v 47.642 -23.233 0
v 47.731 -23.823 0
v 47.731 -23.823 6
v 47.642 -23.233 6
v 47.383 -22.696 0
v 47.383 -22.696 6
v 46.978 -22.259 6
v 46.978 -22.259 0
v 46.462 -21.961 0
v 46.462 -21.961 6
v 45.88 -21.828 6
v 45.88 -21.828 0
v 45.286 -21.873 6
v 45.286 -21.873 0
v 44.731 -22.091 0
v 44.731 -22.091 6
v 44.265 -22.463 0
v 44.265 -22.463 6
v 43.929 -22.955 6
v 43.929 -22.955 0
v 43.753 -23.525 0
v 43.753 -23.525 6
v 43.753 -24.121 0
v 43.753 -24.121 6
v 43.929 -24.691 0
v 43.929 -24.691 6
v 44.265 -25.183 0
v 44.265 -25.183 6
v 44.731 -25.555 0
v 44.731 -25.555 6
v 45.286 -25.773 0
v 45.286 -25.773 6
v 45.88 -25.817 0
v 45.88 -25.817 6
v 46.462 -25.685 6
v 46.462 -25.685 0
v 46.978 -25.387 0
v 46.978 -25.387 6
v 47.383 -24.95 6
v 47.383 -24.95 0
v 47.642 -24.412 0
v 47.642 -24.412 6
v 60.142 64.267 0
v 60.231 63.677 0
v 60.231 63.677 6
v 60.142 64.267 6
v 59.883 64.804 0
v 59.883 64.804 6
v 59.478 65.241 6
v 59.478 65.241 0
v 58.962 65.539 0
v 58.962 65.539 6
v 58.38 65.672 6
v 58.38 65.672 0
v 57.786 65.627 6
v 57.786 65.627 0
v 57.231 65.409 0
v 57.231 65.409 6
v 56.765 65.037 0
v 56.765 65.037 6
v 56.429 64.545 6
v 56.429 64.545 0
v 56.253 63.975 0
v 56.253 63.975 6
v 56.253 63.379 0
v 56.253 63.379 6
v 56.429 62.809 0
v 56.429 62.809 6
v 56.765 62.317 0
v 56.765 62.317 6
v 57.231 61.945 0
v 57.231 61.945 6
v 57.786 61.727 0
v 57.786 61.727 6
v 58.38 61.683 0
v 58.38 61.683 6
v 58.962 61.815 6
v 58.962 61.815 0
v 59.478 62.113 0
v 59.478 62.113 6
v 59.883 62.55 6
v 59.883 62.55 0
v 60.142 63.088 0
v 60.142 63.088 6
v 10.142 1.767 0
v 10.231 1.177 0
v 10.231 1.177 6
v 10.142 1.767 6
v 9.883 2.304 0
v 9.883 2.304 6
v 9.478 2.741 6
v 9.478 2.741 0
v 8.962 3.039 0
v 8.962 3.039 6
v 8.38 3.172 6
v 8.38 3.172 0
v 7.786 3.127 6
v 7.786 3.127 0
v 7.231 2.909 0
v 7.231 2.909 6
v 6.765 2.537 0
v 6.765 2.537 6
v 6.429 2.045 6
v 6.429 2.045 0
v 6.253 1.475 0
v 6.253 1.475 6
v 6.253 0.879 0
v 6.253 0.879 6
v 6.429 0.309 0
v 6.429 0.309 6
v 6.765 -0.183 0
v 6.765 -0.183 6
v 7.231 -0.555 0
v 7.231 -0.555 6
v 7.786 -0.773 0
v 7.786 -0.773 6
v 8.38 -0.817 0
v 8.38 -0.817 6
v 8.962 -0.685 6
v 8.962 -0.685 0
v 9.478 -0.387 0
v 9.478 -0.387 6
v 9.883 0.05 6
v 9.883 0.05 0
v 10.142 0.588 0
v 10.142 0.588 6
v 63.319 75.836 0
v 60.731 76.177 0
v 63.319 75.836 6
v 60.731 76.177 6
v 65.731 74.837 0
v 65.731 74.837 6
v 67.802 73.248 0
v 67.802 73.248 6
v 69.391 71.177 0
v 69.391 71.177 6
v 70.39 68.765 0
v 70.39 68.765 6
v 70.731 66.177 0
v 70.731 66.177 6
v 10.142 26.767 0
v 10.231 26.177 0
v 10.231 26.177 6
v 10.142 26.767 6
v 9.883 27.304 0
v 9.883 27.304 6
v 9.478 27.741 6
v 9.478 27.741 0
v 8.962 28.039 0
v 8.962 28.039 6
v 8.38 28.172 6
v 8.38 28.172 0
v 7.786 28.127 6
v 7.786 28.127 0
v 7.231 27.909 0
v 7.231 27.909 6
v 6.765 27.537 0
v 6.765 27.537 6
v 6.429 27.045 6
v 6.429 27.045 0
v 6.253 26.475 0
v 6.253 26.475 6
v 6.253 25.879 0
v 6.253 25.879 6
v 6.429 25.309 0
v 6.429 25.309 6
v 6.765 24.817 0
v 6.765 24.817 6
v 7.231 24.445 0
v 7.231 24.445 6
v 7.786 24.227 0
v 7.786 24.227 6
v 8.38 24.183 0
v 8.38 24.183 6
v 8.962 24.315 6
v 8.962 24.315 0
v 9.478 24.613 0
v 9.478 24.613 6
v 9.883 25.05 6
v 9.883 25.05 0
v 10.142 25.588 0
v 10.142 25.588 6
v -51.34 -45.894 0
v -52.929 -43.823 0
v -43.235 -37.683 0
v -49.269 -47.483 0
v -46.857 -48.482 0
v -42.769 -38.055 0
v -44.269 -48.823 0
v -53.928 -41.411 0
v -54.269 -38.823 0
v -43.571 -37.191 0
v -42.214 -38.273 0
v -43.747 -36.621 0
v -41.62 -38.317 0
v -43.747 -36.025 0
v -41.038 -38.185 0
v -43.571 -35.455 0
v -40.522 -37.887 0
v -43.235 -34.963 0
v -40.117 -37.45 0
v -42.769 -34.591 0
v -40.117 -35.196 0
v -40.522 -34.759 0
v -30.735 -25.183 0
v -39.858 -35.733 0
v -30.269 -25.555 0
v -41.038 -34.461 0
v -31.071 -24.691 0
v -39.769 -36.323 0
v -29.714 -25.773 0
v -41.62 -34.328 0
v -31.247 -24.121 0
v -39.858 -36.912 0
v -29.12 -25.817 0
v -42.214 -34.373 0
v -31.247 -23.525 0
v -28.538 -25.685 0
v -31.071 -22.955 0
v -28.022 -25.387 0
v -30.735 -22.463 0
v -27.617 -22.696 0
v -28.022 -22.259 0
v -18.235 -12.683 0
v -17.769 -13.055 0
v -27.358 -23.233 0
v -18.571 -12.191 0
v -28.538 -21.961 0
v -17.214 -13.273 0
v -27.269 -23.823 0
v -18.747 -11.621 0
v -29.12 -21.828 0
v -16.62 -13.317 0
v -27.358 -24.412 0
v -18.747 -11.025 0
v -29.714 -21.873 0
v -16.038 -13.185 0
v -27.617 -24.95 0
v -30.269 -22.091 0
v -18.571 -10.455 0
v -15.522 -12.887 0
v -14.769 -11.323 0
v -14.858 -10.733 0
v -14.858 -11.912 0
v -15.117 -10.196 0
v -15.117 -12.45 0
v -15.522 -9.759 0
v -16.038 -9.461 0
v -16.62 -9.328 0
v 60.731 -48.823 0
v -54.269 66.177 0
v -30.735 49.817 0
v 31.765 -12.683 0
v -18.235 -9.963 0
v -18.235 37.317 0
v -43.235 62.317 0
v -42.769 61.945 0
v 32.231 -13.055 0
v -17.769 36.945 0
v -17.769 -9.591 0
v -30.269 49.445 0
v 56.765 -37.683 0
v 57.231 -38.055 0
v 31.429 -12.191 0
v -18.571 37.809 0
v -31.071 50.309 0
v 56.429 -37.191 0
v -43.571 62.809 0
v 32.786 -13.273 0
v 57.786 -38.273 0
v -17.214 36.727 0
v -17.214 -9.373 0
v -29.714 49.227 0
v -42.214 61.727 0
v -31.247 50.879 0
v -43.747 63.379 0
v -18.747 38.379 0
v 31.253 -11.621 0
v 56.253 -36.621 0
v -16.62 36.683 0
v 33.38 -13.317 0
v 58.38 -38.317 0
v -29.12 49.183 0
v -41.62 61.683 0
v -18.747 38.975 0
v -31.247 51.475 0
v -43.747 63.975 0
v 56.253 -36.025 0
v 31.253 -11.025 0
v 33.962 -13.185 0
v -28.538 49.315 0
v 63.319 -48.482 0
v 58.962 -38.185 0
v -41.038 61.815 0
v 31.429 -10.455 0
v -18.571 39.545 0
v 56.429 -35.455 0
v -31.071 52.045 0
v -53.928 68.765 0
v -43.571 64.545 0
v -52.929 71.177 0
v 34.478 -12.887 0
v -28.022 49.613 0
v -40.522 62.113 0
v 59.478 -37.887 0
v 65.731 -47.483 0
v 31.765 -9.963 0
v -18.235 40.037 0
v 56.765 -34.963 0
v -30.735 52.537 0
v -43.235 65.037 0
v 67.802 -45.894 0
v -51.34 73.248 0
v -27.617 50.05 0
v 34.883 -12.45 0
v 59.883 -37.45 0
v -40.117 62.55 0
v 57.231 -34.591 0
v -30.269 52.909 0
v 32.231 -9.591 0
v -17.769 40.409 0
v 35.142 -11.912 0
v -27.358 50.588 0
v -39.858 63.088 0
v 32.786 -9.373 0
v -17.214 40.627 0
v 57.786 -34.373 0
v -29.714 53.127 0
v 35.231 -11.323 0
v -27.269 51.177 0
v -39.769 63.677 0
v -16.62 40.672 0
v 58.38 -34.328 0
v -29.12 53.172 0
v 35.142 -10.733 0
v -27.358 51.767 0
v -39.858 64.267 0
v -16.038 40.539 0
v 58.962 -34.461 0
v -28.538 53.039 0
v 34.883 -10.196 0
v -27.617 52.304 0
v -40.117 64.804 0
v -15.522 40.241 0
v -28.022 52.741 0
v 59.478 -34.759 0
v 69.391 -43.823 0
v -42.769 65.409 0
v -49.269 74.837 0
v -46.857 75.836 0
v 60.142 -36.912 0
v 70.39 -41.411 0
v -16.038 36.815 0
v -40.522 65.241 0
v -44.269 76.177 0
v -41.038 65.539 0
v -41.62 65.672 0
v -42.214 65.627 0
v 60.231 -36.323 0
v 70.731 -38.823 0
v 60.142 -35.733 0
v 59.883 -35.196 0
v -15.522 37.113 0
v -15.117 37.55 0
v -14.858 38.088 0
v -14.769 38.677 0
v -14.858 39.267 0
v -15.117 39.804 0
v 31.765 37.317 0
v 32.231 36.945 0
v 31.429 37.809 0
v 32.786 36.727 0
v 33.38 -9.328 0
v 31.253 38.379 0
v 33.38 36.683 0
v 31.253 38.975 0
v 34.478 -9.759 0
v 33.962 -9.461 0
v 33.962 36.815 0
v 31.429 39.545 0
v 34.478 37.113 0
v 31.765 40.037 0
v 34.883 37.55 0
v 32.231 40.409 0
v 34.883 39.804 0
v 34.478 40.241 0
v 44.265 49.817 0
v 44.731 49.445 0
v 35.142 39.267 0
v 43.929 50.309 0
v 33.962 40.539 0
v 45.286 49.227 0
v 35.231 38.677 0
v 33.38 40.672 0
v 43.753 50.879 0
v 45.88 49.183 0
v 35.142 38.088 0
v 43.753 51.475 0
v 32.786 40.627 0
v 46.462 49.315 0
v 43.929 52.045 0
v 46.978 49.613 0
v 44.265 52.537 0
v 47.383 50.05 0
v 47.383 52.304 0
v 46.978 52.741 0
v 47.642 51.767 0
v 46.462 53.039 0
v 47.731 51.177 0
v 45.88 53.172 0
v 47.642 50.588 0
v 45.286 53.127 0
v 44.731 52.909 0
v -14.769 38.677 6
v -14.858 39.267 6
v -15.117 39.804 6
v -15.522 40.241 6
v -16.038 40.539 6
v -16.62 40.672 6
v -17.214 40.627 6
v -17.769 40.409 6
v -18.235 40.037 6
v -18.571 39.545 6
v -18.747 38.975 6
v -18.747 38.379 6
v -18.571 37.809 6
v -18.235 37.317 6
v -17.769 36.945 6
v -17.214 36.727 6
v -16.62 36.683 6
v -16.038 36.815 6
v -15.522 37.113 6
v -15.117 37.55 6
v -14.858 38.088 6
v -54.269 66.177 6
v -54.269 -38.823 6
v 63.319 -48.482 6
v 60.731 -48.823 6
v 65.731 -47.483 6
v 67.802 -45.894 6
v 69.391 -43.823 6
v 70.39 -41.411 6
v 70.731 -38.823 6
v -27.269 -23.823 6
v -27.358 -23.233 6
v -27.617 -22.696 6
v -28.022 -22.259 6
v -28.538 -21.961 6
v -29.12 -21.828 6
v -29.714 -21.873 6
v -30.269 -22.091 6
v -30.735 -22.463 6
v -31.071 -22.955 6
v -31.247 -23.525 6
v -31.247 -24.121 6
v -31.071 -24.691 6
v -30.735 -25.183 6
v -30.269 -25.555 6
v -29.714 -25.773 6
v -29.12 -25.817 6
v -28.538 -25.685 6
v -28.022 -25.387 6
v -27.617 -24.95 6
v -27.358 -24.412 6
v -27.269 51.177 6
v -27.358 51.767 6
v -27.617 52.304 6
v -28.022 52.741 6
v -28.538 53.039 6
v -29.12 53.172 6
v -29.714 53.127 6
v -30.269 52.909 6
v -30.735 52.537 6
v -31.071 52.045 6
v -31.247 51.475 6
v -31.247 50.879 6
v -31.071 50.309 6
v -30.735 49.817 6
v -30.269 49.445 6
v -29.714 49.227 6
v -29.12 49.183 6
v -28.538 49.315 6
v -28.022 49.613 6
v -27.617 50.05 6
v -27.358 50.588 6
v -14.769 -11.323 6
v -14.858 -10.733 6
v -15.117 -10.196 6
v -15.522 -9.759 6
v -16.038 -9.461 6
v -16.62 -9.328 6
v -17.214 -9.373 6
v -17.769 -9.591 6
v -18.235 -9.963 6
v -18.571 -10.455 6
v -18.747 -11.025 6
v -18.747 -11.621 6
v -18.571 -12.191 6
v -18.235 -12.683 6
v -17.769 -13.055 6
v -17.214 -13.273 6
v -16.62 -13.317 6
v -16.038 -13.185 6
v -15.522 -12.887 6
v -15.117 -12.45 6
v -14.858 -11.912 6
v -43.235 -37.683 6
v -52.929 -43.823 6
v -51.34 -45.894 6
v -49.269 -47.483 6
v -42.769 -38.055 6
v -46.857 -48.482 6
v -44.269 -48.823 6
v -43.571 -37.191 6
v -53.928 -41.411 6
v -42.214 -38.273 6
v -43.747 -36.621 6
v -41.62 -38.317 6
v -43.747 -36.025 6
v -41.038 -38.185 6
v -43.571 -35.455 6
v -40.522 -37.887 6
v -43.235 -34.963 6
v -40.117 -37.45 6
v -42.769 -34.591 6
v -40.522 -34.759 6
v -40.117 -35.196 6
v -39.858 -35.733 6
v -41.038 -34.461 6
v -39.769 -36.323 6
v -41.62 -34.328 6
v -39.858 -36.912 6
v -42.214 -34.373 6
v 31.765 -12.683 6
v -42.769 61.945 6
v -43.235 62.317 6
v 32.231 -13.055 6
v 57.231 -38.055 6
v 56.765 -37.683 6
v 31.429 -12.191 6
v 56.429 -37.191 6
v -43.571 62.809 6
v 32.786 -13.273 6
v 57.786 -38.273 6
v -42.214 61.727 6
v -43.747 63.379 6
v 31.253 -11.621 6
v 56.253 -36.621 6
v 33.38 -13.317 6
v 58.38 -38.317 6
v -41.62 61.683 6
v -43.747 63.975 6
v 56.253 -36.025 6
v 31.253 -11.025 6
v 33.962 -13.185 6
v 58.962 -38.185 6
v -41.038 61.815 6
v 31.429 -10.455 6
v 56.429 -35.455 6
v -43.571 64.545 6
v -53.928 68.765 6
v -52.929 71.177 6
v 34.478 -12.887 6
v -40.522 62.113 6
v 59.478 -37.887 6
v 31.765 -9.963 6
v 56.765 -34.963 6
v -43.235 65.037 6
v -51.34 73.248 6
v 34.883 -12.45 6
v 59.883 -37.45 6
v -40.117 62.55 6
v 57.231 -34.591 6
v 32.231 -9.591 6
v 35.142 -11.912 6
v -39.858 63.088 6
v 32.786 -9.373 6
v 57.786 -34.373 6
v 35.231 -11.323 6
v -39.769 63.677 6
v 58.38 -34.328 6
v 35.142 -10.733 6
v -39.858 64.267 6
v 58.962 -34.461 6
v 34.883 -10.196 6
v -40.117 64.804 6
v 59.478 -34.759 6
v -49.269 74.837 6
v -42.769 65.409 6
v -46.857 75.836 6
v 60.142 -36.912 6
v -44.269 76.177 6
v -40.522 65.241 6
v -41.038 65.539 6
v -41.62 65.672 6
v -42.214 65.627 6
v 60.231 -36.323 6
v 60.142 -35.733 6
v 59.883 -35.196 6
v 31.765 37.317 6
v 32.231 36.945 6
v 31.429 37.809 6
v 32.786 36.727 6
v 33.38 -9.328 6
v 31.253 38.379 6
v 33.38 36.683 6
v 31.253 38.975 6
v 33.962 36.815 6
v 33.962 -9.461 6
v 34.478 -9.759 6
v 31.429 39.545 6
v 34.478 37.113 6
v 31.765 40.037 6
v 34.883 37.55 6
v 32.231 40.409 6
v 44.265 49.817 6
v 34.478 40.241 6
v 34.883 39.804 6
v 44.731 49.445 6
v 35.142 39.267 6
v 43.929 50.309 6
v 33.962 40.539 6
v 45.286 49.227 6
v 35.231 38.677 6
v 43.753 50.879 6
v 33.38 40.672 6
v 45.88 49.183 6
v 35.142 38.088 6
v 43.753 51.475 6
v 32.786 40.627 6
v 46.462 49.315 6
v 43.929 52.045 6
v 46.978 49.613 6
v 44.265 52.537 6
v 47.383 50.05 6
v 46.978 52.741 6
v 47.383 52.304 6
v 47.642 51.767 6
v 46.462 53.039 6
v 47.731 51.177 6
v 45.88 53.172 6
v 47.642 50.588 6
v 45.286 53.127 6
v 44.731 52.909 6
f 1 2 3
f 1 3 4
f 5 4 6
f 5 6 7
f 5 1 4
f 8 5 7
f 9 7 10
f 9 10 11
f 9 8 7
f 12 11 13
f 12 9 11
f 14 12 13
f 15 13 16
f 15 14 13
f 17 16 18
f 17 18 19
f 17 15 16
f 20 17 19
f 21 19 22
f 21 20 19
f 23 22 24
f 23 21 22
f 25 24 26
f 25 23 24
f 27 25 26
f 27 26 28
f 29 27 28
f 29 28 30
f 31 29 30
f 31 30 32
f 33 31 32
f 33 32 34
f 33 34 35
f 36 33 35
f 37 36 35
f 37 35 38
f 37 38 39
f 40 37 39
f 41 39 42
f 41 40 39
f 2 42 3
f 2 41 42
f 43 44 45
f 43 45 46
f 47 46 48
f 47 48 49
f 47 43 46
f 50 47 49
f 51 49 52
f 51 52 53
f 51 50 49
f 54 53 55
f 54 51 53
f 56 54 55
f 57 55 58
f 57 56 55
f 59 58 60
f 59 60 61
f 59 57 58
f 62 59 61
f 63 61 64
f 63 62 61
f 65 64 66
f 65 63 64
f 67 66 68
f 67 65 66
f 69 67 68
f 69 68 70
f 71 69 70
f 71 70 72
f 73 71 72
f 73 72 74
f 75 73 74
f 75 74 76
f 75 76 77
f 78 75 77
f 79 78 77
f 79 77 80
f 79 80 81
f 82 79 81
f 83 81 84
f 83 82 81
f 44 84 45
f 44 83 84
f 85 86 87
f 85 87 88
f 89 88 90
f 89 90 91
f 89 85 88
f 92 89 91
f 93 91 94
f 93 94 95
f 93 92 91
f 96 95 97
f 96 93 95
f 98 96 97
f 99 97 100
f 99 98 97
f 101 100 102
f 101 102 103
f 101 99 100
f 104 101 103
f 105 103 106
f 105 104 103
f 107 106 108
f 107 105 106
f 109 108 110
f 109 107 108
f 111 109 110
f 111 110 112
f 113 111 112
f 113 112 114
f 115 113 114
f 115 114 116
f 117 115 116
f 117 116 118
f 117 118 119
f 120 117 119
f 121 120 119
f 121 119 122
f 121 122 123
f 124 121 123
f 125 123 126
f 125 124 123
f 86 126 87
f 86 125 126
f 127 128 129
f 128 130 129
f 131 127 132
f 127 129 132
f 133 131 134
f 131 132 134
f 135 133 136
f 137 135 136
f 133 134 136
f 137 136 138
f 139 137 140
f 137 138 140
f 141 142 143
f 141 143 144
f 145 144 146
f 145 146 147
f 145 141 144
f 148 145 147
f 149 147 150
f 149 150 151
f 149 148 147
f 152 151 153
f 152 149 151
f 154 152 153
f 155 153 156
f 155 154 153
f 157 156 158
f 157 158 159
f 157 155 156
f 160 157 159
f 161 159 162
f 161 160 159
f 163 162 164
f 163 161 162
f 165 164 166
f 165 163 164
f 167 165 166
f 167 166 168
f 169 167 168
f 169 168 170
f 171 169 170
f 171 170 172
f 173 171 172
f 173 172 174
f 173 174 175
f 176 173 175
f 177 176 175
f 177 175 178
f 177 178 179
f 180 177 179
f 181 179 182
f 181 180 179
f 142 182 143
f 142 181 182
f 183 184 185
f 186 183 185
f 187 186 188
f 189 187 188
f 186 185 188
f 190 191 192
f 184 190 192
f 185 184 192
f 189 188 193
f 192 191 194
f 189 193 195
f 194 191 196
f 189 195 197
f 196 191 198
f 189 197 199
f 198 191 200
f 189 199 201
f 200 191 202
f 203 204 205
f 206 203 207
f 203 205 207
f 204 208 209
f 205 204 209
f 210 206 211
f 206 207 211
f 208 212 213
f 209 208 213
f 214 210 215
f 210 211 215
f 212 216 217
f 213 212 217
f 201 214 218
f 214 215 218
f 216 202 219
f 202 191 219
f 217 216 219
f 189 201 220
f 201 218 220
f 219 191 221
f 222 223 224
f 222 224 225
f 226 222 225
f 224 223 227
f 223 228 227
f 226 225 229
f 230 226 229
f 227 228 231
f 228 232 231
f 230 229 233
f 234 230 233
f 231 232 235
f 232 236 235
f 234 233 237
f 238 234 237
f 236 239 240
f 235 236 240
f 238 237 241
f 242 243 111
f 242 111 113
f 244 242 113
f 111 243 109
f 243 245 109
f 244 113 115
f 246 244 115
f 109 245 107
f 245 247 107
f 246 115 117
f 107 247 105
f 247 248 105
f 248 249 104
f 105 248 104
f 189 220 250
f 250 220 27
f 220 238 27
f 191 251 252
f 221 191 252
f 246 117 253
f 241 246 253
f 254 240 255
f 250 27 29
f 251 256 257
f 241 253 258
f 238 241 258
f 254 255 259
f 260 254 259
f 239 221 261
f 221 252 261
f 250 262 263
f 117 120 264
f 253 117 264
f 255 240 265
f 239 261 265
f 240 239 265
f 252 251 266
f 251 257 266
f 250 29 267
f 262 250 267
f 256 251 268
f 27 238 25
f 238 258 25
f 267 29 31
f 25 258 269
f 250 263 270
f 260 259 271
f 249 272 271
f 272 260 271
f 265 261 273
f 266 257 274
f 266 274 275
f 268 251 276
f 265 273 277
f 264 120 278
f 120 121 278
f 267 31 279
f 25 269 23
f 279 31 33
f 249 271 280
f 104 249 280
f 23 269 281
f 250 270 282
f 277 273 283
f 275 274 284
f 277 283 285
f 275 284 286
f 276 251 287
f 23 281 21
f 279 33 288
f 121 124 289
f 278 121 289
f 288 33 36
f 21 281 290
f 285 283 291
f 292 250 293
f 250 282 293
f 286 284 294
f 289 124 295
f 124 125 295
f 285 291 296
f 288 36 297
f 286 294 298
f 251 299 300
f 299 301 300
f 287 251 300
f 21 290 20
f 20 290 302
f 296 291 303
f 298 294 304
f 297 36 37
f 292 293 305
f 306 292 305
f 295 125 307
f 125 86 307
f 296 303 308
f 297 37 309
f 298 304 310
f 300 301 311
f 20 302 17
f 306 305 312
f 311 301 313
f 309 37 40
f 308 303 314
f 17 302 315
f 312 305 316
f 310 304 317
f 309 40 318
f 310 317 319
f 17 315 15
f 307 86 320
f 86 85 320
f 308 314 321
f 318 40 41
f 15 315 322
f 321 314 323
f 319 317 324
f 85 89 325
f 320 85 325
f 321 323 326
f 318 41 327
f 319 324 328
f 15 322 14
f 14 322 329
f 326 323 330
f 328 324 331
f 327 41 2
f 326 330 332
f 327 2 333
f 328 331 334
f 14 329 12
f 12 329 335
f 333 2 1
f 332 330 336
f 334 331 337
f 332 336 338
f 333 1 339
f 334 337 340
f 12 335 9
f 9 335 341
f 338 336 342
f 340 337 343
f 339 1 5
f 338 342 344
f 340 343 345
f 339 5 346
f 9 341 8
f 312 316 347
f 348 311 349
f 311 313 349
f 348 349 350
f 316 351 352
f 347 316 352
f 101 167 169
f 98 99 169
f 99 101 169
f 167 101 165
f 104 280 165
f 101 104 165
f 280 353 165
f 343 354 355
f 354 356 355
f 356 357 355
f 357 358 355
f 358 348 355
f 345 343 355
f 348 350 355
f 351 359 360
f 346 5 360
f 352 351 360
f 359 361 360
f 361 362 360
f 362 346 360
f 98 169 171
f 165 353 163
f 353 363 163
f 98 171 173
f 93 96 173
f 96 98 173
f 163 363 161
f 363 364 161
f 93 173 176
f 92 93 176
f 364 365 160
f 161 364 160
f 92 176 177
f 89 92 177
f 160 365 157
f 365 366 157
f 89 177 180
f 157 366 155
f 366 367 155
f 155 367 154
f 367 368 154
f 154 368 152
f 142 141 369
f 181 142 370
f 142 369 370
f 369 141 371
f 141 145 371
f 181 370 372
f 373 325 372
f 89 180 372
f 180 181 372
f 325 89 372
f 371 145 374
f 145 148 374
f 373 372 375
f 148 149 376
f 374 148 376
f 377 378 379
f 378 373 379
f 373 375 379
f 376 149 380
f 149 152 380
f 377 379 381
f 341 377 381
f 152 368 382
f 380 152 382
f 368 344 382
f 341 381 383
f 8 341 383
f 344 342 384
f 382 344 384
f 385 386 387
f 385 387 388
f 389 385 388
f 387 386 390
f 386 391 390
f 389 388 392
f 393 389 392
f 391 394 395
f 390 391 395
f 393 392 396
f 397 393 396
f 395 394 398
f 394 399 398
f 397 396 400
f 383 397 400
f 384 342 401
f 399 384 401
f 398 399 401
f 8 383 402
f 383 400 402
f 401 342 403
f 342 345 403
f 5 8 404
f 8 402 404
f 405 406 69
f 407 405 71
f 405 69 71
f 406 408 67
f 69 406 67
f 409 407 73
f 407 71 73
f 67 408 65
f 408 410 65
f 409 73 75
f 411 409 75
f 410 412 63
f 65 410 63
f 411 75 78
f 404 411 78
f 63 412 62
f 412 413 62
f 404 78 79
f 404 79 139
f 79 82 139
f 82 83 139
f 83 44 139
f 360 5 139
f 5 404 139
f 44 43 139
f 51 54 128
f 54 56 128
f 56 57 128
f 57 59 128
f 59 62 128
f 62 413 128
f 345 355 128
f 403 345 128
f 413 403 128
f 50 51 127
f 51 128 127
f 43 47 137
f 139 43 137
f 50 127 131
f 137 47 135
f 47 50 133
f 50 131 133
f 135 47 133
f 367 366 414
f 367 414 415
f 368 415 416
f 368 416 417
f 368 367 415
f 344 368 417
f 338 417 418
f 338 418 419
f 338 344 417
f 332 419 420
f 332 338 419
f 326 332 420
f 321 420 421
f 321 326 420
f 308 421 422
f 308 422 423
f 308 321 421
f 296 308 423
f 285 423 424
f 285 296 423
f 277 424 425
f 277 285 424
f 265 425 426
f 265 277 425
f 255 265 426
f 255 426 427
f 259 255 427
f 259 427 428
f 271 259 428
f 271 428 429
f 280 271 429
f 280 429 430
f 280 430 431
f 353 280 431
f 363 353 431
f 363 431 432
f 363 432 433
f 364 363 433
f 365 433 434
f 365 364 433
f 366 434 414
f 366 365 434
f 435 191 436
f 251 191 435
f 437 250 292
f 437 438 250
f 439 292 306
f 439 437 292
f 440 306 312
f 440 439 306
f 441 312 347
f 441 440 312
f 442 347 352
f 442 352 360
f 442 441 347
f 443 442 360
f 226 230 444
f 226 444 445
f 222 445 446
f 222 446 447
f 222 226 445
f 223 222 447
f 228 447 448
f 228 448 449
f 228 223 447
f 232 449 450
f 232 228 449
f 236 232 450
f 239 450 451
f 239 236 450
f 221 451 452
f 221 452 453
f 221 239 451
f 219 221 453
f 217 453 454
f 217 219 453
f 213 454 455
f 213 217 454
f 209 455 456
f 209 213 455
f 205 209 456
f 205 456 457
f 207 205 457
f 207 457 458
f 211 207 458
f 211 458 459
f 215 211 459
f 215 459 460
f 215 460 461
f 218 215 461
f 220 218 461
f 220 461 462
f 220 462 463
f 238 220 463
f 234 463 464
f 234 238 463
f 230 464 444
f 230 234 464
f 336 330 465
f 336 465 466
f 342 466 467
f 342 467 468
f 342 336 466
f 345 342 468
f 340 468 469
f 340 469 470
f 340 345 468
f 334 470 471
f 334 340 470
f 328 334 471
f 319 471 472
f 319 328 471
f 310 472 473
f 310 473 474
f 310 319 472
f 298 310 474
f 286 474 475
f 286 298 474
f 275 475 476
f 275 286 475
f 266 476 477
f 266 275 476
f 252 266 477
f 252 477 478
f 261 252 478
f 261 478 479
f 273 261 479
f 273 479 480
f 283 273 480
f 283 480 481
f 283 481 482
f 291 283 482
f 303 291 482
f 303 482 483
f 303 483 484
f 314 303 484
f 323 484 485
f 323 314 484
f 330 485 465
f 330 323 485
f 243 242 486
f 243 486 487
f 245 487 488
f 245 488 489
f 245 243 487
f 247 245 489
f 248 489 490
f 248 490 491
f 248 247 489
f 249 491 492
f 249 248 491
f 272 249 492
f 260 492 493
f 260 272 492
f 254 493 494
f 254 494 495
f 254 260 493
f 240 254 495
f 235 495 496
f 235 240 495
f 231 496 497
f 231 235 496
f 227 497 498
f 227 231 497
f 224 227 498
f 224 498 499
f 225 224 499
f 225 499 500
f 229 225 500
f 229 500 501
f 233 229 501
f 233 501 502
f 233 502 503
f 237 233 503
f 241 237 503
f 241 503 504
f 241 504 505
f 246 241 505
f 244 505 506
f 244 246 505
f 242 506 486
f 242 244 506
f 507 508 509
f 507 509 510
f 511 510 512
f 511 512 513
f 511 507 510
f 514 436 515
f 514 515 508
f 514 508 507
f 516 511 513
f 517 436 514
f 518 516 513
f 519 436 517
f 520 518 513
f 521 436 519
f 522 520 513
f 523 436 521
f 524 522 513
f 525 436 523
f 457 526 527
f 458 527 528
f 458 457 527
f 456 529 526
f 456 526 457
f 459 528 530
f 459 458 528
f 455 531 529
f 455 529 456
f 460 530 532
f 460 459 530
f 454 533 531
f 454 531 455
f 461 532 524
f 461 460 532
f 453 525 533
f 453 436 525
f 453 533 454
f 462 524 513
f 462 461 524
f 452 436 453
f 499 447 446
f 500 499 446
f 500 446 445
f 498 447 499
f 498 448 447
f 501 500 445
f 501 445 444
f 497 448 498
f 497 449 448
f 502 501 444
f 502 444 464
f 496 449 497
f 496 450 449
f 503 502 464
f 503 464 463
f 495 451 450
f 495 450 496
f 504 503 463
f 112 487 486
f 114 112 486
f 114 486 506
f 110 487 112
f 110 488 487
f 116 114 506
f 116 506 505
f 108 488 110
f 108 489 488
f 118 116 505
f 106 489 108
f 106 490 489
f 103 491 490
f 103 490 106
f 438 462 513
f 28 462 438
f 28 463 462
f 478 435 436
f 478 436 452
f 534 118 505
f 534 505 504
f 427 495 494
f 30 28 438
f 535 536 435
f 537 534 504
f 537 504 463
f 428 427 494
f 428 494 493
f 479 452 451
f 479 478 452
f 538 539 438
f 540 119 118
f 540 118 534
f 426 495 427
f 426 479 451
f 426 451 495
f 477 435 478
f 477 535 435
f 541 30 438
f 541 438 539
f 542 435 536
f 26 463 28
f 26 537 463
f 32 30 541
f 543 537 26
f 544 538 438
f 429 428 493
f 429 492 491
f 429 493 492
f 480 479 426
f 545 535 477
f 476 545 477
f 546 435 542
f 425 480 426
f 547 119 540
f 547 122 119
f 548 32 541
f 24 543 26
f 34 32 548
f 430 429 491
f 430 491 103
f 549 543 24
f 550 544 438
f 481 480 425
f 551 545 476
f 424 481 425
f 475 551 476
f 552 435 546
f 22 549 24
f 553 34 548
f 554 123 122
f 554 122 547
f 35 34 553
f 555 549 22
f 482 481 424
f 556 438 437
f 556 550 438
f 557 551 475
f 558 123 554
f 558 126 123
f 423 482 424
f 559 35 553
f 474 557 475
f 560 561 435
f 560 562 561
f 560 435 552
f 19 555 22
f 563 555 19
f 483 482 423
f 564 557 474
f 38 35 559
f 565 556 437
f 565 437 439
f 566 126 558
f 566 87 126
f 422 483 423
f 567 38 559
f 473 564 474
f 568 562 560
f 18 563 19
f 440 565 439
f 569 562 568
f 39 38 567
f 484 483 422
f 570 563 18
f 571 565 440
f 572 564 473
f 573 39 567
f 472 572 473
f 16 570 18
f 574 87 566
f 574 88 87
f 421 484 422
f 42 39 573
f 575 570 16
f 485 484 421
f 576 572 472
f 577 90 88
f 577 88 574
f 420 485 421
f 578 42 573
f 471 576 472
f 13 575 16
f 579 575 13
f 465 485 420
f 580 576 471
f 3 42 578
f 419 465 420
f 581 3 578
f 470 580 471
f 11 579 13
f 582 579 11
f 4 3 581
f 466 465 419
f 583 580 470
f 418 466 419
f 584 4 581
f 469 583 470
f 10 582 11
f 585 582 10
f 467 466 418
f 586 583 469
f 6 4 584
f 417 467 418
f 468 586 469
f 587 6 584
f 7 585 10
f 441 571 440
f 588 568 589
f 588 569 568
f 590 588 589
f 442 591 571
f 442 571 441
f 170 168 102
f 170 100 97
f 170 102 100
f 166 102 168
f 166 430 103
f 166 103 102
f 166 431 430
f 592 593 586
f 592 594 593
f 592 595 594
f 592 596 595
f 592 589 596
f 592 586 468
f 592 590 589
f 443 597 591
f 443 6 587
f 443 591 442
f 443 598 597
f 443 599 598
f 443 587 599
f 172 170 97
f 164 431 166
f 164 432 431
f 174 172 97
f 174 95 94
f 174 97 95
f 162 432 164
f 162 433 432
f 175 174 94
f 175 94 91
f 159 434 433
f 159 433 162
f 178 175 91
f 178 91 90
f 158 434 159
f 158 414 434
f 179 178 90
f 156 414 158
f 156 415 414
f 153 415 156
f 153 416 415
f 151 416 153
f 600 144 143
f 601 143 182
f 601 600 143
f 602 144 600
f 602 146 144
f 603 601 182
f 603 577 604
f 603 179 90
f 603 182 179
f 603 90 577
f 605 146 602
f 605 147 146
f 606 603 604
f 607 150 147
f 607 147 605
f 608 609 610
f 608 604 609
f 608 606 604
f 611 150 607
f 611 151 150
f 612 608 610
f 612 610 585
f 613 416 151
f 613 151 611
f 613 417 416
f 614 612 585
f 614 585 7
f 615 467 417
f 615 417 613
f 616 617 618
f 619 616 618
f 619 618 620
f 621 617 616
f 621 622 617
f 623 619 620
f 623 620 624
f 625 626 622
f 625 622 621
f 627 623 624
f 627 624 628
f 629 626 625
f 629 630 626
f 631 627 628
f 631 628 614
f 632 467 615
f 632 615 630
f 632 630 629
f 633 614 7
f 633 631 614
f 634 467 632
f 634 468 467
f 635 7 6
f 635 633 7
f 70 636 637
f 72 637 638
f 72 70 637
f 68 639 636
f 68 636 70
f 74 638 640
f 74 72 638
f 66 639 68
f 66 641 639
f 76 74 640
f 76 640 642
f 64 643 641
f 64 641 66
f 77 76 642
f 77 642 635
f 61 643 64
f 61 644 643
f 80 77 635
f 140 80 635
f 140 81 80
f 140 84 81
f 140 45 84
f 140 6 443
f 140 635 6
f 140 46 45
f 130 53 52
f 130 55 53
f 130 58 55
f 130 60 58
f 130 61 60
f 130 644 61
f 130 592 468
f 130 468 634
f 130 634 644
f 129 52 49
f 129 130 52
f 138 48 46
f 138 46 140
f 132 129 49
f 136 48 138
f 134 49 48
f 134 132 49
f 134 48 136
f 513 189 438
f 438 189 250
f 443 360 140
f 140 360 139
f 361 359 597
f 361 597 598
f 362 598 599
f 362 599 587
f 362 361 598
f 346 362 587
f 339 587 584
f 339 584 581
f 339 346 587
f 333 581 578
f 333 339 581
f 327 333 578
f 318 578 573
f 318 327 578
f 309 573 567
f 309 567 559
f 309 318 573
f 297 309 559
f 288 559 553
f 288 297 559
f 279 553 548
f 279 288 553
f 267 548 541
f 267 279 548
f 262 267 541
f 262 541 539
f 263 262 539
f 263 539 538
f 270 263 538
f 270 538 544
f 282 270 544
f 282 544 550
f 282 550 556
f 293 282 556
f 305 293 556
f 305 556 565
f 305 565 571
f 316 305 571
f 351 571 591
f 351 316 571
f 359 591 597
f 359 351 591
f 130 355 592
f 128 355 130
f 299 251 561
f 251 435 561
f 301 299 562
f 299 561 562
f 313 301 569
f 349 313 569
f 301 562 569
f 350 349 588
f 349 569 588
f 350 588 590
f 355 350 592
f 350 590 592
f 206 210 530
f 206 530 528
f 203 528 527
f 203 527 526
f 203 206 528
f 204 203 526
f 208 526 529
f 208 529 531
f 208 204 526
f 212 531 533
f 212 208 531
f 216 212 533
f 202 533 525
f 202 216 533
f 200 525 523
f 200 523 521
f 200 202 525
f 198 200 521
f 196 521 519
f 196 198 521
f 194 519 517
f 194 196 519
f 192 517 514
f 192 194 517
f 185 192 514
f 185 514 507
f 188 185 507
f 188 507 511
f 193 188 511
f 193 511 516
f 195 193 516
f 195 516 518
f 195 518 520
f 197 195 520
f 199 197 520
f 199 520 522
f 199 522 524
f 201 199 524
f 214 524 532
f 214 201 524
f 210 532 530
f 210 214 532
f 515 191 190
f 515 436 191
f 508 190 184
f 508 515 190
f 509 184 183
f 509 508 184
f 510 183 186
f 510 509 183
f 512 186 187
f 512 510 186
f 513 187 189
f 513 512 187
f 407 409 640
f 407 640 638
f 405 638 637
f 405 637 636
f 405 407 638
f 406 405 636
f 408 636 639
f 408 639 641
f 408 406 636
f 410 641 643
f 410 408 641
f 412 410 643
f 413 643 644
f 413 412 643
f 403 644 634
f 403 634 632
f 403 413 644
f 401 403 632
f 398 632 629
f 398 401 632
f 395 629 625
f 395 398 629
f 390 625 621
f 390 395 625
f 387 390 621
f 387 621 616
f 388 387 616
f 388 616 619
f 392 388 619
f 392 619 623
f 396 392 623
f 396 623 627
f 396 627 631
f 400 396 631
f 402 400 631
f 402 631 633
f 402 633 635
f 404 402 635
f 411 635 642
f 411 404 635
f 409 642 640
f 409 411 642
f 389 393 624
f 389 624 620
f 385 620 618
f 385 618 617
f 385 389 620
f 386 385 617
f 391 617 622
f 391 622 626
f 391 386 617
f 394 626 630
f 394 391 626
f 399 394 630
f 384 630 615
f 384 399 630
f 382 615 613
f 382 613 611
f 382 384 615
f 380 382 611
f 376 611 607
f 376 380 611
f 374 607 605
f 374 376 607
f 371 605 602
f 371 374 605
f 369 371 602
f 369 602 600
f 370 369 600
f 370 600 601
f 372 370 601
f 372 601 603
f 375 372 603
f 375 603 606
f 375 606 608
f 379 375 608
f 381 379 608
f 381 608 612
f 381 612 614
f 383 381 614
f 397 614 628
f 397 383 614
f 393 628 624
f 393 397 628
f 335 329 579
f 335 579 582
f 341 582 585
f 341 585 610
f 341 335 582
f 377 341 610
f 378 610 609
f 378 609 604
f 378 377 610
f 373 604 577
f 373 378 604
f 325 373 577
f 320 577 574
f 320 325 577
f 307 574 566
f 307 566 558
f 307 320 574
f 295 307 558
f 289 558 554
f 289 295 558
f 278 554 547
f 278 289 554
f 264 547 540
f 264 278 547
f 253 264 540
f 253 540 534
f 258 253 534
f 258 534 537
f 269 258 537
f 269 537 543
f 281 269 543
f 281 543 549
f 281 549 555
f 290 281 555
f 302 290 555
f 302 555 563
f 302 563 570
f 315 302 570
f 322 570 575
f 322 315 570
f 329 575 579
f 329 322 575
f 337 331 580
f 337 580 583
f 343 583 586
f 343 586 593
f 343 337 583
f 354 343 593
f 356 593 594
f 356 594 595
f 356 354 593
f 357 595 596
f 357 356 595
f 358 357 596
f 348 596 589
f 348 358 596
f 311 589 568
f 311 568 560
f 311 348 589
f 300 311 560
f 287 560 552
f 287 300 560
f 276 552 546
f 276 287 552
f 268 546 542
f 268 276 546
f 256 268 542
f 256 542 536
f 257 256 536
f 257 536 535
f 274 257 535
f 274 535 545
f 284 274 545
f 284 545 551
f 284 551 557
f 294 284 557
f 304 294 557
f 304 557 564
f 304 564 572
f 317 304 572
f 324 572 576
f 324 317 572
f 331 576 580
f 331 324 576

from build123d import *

# Parameters (mm, degrees)
F0_W     = 125
F0_H     = 125
F0_R     = 2
F1_DEPTH = 6
F2_R     = 10


with BuildPart() as f1:
    # F0 (on Top) → F1 (new body)
    with BuildSketch(Plane.XY):
        with Locations((8.230951, 13.677106)):
            Rectangle(F0_W, F0_H)
        with Locations((-41.769049, -36.322894)):
            Circle(F0_R, mode=Mode.SUBTRACT)
        with Locations((-29.269049, -23.822894)):
            Circle(F0_R, mode=Mode.SUBTRACT)
        with Locations((-16.769049, -11.322894)):
            Circle(F0_R, mode=Mode.SUBTRACT)
        with Locations((58.230951, -36.322894)):
            Circle(F0_R, mode=Mode.SUBTRACT)
        with Locations((45.730951, -23.822894)):
            Circle(F0_R, mode=Mode.SUBTRACT)
        with Locations((33.230951, -11.322894)):
            Circle(F0_R, mode=Mode.SUBTRACT)
        with Locations((8.230951, 1.177106)):
            Circle(F0_R, mode=Mode.SUBTRACT)
        with Locations((-16.769049, 38.677106)):
            Circle(F0_R, mode=Mode.SUBTRACT)
        with Locations((-29.269049, 51.177106)):
            Circle(F0_R, mode=Mode.SUBTRACT)
        with Locations((-41.769049, 63.677106)):
            Circle(F0_R, mode=Mode.SUBTRACT)
        with Locations((8.230951, 26.177108)):
            Circle(F0_R, mode=Mode.SUBTRACT)
        with Locations((33.230951, 38.677106)):
            Circle(F0_R, mode=Mode.SUBTRACT)
        with Locations((45.730951, 51.177106)):
            Circle(F0_R, mode=Mode.SUBTRACT)
        with Locations((58.230951, 63.677106)):
            Circle(F0_R, mode=Mode.SUBTRACT)
    extrude(amount=F1_DEPTH)

    # F2
    f2_edges = [f1.edges().sort_by_distance(p)[0] for p in [
        (-54.269049, 76.177106, 3),
        (-54.269049, -48.822894, 3),
        (70.730951, -48.822894, 3),
        (70.730951, 76.177106, 3),
    ]]
    fillet(f2_edges, radius=F2_R)


solid = f1.part
